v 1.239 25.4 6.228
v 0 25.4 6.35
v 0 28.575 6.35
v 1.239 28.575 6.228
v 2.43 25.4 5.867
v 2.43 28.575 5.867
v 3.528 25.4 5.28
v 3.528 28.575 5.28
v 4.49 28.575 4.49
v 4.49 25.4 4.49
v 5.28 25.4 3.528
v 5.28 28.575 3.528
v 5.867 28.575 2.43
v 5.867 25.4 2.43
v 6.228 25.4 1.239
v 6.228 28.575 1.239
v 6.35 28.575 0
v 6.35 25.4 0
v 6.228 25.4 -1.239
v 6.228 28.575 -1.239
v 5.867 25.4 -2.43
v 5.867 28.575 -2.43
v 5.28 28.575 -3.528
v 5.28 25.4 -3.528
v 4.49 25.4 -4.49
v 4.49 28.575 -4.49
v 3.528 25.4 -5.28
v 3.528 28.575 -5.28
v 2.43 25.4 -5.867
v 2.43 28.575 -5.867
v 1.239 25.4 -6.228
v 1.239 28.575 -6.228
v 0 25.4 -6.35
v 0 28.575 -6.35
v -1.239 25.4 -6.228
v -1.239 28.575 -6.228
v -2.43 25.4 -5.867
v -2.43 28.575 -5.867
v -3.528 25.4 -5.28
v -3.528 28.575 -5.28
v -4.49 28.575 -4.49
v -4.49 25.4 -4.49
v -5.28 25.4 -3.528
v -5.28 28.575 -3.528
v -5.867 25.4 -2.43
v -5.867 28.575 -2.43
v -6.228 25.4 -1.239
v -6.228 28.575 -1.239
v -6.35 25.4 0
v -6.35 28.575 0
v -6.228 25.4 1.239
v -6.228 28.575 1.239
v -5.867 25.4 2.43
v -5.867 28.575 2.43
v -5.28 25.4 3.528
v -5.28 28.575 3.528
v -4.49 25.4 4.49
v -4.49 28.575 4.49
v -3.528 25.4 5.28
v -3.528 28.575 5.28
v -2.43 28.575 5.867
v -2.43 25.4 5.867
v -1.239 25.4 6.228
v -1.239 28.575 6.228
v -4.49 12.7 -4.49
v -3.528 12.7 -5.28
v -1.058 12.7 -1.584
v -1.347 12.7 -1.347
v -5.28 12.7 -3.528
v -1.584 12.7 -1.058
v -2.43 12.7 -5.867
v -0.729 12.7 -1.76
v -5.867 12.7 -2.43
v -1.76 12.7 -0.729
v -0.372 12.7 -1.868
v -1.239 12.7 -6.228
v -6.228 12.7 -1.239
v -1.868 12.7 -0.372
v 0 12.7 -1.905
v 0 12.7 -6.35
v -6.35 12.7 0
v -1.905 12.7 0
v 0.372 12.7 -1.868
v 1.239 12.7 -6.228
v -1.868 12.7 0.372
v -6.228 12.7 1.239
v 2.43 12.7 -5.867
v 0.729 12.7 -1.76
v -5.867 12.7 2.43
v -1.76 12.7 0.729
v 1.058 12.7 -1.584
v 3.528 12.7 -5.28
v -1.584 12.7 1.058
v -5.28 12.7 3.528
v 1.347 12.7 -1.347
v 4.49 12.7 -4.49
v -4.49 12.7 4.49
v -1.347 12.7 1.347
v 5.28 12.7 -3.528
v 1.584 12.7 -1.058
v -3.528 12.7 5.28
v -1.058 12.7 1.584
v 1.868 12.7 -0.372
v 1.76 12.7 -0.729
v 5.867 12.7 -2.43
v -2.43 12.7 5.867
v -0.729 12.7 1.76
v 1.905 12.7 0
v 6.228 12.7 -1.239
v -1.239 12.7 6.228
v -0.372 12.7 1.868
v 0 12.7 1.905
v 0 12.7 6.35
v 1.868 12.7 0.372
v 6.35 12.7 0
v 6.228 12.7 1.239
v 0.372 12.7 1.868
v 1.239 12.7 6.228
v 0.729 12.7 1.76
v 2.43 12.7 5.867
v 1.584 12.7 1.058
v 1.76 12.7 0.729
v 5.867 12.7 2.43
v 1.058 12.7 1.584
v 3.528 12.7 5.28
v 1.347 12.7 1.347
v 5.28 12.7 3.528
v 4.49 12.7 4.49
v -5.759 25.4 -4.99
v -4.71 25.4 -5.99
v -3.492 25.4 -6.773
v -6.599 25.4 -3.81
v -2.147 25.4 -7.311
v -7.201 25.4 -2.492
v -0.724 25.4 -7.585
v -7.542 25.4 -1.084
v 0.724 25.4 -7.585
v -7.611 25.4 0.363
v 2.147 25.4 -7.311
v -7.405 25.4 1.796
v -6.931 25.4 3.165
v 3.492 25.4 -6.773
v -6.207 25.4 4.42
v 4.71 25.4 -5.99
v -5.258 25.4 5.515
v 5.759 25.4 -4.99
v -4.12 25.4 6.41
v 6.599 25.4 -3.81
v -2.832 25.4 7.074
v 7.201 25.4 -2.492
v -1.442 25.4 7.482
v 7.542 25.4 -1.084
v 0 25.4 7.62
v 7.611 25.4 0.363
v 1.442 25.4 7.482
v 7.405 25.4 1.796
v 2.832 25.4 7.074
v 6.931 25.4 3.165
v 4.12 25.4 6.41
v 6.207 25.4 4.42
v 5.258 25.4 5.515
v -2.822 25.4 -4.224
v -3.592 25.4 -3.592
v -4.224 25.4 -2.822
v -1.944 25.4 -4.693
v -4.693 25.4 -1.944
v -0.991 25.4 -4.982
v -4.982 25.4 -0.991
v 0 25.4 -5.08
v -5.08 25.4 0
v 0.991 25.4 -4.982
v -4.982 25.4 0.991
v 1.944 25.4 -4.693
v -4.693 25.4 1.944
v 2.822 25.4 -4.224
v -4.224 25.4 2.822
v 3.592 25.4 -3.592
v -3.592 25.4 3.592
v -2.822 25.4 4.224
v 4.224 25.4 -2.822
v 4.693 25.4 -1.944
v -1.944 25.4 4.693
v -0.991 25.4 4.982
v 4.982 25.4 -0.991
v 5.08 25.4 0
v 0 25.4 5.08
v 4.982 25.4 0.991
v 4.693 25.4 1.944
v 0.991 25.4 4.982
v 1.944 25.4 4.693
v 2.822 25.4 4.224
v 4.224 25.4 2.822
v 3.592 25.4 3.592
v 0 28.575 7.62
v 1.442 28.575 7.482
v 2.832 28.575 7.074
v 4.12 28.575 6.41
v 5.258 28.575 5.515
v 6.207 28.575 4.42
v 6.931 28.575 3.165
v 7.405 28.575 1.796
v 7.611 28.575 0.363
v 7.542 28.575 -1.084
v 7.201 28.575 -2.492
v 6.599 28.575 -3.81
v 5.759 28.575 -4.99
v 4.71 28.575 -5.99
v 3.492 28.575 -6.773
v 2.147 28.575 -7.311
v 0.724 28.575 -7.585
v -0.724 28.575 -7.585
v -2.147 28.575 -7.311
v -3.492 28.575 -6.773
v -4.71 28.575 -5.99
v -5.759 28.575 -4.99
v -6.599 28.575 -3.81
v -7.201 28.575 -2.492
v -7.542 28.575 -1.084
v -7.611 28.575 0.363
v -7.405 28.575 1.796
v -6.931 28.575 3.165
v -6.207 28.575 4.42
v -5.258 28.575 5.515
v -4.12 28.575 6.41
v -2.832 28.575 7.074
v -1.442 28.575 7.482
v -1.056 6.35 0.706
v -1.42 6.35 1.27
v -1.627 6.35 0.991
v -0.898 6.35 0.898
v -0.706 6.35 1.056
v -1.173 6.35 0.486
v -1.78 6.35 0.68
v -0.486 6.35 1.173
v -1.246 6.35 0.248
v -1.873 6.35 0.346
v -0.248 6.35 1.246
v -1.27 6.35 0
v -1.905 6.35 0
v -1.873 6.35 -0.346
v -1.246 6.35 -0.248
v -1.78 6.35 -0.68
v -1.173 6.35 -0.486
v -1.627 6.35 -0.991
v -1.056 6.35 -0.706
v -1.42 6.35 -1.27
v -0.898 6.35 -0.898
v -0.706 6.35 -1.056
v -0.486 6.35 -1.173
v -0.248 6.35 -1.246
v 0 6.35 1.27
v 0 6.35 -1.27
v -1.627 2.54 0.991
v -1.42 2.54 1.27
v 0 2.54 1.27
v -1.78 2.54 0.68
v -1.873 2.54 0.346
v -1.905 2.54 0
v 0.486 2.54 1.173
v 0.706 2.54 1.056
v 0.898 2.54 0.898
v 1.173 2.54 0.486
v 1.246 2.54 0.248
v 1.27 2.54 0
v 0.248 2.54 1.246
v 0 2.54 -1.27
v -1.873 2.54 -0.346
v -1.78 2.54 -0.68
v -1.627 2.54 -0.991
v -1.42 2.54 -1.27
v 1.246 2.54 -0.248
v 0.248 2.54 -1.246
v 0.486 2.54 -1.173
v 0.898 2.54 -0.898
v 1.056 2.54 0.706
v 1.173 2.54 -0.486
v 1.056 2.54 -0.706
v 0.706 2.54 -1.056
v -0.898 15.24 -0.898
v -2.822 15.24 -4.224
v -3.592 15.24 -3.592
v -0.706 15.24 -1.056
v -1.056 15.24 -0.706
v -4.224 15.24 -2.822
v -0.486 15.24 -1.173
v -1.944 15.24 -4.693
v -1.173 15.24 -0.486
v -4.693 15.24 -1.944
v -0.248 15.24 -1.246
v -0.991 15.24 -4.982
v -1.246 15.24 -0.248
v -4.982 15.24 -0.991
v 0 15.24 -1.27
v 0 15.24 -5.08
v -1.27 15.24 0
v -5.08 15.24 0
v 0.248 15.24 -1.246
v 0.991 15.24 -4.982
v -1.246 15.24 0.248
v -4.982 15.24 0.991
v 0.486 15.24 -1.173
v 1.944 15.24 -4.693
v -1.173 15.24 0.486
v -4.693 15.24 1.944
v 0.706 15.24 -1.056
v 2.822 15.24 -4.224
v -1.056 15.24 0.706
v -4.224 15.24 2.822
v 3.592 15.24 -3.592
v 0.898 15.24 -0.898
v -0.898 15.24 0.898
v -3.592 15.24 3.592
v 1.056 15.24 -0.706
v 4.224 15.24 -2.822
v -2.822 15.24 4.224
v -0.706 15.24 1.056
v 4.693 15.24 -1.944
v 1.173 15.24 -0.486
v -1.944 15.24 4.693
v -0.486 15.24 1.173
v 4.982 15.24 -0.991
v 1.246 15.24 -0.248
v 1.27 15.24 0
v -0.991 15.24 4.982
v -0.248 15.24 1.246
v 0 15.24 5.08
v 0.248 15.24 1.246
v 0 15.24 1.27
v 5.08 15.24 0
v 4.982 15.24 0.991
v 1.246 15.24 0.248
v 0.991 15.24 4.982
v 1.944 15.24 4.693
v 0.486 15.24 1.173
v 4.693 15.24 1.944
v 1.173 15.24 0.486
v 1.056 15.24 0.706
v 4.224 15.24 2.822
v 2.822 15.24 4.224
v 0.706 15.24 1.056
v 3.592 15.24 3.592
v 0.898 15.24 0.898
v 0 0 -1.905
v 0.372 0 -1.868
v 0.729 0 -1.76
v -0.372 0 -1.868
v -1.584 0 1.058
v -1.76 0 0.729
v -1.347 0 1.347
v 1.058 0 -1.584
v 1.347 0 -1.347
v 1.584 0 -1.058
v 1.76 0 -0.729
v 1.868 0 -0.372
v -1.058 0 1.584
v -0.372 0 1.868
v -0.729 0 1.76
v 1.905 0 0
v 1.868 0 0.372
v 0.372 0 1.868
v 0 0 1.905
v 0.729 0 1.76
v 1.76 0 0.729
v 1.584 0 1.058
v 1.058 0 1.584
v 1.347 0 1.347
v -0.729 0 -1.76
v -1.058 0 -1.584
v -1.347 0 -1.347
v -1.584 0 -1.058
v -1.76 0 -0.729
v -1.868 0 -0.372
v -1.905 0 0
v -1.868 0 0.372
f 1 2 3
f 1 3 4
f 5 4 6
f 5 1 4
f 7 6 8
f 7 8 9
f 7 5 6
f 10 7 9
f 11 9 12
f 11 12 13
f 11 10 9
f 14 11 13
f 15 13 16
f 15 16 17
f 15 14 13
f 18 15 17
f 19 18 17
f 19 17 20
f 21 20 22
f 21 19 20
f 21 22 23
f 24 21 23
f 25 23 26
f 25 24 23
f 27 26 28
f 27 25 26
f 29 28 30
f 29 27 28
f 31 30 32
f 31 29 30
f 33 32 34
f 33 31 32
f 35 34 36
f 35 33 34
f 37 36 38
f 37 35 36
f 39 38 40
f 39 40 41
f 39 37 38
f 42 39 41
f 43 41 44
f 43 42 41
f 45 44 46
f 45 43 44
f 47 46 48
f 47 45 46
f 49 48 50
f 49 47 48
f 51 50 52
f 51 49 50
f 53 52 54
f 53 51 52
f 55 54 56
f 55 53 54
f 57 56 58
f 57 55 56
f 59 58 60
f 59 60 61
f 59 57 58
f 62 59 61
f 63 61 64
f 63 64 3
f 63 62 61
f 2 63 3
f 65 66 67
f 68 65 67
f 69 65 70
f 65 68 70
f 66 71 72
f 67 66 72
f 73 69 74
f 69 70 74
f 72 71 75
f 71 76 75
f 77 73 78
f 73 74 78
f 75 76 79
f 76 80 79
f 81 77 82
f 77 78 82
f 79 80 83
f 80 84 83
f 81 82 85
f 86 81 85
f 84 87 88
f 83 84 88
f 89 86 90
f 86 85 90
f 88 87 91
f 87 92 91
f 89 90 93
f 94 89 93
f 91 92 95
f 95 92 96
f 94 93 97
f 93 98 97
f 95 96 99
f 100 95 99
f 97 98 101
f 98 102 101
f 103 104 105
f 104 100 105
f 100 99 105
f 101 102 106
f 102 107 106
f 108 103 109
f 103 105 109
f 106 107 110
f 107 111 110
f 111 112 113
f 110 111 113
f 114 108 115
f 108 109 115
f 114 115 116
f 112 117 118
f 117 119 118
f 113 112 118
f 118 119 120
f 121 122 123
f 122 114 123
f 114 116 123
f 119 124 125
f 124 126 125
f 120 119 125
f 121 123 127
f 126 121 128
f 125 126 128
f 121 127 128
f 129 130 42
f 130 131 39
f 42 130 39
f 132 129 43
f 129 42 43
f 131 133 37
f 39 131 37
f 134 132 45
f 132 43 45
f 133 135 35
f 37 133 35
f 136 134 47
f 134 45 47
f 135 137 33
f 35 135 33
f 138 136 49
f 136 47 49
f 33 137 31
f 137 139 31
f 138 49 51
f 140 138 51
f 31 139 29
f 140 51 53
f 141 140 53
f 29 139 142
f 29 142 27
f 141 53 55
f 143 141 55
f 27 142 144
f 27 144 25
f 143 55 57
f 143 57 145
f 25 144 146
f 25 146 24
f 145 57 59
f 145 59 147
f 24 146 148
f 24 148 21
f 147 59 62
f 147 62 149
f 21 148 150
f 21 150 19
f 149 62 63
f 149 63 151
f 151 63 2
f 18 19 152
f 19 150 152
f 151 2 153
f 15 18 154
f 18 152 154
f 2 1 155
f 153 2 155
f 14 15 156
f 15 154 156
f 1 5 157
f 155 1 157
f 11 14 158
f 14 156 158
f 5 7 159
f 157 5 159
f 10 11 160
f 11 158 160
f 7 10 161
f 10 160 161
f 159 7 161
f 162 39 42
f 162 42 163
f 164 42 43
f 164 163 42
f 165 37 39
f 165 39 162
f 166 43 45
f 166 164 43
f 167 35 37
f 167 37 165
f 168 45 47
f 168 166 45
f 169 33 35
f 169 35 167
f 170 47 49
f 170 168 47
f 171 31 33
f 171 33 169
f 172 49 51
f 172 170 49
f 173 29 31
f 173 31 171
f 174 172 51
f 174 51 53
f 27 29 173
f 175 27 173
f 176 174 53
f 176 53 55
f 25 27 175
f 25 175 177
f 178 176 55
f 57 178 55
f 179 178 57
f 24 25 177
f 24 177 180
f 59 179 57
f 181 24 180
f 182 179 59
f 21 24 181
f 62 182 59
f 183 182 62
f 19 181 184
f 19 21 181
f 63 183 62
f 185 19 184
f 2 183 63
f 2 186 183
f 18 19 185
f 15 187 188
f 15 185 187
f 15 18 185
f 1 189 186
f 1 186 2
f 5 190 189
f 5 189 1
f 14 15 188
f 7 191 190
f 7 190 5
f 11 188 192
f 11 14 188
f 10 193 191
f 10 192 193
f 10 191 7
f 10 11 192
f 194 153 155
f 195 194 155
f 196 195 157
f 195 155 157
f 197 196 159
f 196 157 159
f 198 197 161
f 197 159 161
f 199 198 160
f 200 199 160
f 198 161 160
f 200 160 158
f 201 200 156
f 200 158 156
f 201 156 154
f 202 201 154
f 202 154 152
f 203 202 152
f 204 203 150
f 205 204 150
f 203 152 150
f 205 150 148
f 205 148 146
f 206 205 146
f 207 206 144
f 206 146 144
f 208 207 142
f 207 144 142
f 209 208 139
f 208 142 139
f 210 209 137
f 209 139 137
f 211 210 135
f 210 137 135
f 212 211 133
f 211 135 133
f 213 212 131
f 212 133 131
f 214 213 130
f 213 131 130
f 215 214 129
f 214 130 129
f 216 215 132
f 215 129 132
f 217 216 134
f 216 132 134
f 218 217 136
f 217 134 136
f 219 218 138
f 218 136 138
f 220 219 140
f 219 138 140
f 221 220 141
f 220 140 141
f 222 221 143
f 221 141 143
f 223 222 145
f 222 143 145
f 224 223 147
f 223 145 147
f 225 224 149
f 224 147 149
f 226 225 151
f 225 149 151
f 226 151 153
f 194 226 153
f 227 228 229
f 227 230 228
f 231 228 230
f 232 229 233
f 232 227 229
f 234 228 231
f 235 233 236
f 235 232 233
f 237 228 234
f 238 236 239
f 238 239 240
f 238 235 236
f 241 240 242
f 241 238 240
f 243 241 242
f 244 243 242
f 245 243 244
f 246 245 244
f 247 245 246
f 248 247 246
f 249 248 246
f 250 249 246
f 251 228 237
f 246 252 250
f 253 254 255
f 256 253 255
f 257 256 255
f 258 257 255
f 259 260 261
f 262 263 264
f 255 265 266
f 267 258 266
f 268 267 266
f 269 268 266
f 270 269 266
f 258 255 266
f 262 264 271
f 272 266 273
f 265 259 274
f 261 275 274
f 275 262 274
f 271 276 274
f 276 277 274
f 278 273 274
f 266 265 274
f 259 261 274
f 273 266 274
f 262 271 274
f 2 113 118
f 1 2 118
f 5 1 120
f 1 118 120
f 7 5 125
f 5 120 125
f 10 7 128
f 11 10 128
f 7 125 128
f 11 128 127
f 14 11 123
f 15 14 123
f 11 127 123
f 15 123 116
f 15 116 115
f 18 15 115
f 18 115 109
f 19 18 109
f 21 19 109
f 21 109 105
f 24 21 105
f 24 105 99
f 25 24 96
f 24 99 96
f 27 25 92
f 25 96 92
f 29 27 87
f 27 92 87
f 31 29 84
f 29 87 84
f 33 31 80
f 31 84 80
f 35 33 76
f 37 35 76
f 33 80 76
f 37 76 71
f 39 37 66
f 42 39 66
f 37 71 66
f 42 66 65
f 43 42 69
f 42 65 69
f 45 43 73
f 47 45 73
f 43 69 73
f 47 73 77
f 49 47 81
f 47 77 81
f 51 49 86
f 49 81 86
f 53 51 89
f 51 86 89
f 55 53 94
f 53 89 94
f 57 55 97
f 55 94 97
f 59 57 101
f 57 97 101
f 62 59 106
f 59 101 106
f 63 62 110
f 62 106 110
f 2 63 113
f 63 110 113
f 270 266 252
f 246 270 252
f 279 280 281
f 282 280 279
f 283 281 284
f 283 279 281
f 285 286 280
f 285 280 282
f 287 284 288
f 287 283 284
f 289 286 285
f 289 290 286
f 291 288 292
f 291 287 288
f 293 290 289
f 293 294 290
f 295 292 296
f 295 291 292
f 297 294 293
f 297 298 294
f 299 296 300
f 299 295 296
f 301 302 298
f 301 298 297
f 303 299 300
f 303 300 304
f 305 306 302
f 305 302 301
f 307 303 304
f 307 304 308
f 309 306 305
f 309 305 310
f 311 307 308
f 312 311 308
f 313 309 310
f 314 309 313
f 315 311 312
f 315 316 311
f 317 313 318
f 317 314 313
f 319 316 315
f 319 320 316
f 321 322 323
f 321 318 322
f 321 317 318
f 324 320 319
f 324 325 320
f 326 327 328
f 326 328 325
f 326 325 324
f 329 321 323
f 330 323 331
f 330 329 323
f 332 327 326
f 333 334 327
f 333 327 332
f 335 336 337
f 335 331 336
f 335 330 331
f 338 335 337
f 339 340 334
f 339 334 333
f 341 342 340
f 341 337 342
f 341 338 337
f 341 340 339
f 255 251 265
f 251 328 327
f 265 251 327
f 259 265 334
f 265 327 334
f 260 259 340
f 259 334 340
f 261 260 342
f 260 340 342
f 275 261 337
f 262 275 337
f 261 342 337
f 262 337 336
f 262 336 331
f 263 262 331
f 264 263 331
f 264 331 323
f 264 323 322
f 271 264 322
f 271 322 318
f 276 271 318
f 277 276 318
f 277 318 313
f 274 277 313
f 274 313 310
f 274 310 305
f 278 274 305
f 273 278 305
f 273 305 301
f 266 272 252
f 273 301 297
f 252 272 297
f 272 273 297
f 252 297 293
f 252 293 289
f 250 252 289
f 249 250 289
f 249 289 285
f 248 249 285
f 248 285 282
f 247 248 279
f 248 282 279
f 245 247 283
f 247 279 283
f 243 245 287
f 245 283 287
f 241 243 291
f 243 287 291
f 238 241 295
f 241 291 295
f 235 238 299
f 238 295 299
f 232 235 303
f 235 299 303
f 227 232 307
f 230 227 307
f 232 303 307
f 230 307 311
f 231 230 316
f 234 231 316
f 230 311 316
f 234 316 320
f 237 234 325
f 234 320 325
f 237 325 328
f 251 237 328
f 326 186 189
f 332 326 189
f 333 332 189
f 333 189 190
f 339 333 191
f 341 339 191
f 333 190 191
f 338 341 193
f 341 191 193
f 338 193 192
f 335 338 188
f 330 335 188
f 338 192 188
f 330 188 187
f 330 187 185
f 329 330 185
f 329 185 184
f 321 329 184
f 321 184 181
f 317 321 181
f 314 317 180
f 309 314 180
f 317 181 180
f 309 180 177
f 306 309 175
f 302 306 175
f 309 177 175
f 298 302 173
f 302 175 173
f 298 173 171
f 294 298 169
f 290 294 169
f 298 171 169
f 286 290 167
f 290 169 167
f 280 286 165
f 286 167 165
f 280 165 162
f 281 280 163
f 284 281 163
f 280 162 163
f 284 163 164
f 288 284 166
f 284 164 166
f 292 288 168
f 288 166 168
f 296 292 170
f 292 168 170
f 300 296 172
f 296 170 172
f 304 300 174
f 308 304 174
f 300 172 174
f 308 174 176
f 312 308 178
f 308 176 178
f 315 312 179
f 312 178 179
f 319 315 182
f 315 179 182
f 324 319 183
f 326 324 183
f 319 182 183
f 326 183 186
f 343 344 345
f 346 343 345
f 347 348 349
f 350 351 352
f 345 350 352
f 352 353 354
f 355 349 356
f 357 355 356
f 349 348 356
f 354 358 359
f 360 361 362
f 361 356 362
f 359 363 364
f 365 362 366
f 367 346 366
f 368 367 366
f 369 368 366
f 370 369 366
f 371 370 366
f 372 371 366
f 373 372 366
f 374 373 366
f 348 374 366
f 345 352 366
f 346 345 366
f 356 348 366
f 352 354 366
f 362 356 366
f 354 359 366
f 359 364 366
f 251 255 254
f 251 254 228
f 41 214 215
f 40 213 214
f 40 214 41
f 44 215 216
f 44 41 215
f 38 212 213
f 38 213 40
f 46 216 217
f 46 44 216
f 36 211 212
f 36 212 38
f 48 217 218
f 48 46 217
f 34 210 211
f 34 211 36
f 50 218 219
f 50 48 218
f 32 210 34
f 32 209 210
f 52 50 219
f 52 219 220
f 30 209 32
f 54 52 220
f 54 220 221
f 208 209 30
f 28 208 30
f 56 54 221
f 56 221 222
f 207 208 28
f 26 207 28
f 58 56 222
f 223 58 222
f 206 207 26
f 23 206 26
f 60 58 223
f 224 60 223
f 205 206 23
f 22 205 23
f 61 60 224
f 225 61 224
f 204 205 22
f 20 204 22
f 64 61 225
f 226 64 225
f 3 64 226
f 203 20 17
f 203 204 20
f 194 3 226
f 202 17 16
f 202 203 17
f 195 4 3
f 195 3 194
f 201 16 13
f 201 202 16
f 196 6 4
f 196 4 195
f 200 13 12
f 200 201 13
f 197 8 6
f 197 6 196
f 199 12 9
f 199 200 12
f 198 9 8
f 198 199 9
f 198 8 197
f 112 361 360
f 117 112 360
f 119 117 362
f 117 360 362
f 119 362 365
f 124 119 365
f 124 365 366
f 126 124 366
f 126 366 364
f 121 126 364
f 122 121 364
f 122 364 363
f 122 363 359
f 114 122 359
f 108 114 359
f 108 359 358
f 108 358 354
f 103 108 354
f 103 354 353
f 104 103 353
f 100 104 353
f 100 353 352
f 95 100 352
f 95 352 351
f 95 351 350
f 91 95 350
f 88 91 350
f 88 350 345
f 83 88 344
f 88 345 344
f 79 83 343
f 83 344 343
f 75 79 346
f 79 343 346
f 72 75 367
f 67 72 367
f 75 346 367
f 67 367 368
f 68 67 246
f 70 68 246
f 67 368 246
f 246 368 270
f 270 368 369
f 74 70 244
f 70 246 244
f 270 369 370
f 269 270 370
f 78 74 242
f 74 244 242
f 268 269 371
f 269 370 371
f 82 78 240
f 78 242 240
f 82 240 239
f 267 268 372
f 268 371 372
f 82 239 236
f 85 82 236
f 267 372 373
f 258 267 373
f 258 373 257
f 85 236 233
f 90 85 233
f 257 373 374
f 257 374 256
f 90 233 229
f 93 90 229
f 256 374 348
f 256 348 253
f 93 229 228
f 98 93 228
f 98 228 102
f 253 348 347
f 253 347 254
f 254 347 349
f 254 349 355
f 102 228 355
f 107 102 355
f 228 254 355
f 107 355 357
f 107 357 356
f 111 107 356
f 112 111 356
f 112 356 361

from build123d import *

# Parameters (mm, degrees)
SKETCH1_R           = 1.905
BOSS_EXTRUDE1_DEPTH = 12.7
SKETCH2_R           = 6.35
BOSS_EXTRUDE2_DEPTH = 12.7
SKETCH4_R           = 5.08
CUT_EXTRUDE2_DEPTH  = 10.16
SKETCH5_R           = 1.27
CUT_EXTRUDE3_DEPTH  = 12.7
SKETCH6_W           = 2.54
SKETCH6_H           = 3.81
CUT_EXTRUDE4_DEPTH  = 5.08
SKETCH7_R           = 7.62
SKETCH7_R_2         = 6.35
BOSS_EXTRUDE3_DEPTH = 3.175


with BuildPart() as part:
    # Sketch1 → Boss-Extrude1 (new body)
    with BuildSketch(Plane(origin=(0, 0, 0), x_dir=(1, 0, 0), z_dir=(0, 1, 0))):
        with Locations(Location((0, 0, 0), (0, 0, 270))):
            Circle(SKETCH1_R)
    extrude(amount=BOSS_EXTRUDE1_DEPTH)

    # Sketch2 → Boss-Extrude2 (add)
    with BuildSketch(Plane(origin=(0, 12.7, 0), x_dir=(1, 0, 0), z_dir=(0, 1, 0))):
        with Locations(Location((0, 0, 0), (0, 0, 270))):
            Circle(SKETCH2_R)
    extrude(amount=BOSS_EXTRUDE2_DEPTH)

    # Sketch4 → Cut-Extrude2 (cut)
    with BuildSketch(Plane(origin=(0, 25.4, 0), x_dir=(1, 0, 0), z_dir=(0, 1, 0))):
        with Locations(Location((0, 0, 0), (0, 0, 270))):
            Circle(SKETCH4_R)
    extrude(amount=-CUT_EXTRUDE2_DEPTH, mode=Mode.SUBTRACT)

    # Sketch5 → Cut-Extrude3 (cut)
    with BuildSketch(Plane(origin=(0, 15.24, 0), x_dir=(1, 0, 0), z_dir=(0, 1, 0))):
        with Locations(Location((0, 0, 0), (0, 0, 270))):
            Circle(SKETCH5_R)
    extrude(amount=-CUT_EXTRUDE3_DEPTH, mode=Mode.SUBTRACT)

    # Sketch6 → Cut-Extrude4 (cut)
    with BuildSketch(Plane(origin=(0, 0, 0), x_dir=(0, 0, -1), z_dir=(1, 0, 0))):
        with Locations((0, 4.445)):
            Rectangle(SKETCH6_W, SKETCH6_H)
    extrude(amount=-CUT_EXTRUDE4_DEPTH, mode=Mode.SUBTRACT)


with BuildPart() as body_2:
    # Sketch7 → Boss-Extrude3 (new body)
    with BuildSketch(Plane(origin=(0, 25.4, 0), x_dir=(1, 0, 0), z_dir=(0, 1, 0))):
        with Locations(Location((0, 0, 0), (0, 0, 270))):
            Circle(SKETCH7_R)
        with Locations(Location((0, 0, 0), (0, 0, 270))):
            Circle(SKETCH7_R_2, mode=Mode.SUBTRACT)
    extrude(amount=BOSS_EXTRUDE3_DEPTH)


solid = Compound([part.part, body_2.part])
